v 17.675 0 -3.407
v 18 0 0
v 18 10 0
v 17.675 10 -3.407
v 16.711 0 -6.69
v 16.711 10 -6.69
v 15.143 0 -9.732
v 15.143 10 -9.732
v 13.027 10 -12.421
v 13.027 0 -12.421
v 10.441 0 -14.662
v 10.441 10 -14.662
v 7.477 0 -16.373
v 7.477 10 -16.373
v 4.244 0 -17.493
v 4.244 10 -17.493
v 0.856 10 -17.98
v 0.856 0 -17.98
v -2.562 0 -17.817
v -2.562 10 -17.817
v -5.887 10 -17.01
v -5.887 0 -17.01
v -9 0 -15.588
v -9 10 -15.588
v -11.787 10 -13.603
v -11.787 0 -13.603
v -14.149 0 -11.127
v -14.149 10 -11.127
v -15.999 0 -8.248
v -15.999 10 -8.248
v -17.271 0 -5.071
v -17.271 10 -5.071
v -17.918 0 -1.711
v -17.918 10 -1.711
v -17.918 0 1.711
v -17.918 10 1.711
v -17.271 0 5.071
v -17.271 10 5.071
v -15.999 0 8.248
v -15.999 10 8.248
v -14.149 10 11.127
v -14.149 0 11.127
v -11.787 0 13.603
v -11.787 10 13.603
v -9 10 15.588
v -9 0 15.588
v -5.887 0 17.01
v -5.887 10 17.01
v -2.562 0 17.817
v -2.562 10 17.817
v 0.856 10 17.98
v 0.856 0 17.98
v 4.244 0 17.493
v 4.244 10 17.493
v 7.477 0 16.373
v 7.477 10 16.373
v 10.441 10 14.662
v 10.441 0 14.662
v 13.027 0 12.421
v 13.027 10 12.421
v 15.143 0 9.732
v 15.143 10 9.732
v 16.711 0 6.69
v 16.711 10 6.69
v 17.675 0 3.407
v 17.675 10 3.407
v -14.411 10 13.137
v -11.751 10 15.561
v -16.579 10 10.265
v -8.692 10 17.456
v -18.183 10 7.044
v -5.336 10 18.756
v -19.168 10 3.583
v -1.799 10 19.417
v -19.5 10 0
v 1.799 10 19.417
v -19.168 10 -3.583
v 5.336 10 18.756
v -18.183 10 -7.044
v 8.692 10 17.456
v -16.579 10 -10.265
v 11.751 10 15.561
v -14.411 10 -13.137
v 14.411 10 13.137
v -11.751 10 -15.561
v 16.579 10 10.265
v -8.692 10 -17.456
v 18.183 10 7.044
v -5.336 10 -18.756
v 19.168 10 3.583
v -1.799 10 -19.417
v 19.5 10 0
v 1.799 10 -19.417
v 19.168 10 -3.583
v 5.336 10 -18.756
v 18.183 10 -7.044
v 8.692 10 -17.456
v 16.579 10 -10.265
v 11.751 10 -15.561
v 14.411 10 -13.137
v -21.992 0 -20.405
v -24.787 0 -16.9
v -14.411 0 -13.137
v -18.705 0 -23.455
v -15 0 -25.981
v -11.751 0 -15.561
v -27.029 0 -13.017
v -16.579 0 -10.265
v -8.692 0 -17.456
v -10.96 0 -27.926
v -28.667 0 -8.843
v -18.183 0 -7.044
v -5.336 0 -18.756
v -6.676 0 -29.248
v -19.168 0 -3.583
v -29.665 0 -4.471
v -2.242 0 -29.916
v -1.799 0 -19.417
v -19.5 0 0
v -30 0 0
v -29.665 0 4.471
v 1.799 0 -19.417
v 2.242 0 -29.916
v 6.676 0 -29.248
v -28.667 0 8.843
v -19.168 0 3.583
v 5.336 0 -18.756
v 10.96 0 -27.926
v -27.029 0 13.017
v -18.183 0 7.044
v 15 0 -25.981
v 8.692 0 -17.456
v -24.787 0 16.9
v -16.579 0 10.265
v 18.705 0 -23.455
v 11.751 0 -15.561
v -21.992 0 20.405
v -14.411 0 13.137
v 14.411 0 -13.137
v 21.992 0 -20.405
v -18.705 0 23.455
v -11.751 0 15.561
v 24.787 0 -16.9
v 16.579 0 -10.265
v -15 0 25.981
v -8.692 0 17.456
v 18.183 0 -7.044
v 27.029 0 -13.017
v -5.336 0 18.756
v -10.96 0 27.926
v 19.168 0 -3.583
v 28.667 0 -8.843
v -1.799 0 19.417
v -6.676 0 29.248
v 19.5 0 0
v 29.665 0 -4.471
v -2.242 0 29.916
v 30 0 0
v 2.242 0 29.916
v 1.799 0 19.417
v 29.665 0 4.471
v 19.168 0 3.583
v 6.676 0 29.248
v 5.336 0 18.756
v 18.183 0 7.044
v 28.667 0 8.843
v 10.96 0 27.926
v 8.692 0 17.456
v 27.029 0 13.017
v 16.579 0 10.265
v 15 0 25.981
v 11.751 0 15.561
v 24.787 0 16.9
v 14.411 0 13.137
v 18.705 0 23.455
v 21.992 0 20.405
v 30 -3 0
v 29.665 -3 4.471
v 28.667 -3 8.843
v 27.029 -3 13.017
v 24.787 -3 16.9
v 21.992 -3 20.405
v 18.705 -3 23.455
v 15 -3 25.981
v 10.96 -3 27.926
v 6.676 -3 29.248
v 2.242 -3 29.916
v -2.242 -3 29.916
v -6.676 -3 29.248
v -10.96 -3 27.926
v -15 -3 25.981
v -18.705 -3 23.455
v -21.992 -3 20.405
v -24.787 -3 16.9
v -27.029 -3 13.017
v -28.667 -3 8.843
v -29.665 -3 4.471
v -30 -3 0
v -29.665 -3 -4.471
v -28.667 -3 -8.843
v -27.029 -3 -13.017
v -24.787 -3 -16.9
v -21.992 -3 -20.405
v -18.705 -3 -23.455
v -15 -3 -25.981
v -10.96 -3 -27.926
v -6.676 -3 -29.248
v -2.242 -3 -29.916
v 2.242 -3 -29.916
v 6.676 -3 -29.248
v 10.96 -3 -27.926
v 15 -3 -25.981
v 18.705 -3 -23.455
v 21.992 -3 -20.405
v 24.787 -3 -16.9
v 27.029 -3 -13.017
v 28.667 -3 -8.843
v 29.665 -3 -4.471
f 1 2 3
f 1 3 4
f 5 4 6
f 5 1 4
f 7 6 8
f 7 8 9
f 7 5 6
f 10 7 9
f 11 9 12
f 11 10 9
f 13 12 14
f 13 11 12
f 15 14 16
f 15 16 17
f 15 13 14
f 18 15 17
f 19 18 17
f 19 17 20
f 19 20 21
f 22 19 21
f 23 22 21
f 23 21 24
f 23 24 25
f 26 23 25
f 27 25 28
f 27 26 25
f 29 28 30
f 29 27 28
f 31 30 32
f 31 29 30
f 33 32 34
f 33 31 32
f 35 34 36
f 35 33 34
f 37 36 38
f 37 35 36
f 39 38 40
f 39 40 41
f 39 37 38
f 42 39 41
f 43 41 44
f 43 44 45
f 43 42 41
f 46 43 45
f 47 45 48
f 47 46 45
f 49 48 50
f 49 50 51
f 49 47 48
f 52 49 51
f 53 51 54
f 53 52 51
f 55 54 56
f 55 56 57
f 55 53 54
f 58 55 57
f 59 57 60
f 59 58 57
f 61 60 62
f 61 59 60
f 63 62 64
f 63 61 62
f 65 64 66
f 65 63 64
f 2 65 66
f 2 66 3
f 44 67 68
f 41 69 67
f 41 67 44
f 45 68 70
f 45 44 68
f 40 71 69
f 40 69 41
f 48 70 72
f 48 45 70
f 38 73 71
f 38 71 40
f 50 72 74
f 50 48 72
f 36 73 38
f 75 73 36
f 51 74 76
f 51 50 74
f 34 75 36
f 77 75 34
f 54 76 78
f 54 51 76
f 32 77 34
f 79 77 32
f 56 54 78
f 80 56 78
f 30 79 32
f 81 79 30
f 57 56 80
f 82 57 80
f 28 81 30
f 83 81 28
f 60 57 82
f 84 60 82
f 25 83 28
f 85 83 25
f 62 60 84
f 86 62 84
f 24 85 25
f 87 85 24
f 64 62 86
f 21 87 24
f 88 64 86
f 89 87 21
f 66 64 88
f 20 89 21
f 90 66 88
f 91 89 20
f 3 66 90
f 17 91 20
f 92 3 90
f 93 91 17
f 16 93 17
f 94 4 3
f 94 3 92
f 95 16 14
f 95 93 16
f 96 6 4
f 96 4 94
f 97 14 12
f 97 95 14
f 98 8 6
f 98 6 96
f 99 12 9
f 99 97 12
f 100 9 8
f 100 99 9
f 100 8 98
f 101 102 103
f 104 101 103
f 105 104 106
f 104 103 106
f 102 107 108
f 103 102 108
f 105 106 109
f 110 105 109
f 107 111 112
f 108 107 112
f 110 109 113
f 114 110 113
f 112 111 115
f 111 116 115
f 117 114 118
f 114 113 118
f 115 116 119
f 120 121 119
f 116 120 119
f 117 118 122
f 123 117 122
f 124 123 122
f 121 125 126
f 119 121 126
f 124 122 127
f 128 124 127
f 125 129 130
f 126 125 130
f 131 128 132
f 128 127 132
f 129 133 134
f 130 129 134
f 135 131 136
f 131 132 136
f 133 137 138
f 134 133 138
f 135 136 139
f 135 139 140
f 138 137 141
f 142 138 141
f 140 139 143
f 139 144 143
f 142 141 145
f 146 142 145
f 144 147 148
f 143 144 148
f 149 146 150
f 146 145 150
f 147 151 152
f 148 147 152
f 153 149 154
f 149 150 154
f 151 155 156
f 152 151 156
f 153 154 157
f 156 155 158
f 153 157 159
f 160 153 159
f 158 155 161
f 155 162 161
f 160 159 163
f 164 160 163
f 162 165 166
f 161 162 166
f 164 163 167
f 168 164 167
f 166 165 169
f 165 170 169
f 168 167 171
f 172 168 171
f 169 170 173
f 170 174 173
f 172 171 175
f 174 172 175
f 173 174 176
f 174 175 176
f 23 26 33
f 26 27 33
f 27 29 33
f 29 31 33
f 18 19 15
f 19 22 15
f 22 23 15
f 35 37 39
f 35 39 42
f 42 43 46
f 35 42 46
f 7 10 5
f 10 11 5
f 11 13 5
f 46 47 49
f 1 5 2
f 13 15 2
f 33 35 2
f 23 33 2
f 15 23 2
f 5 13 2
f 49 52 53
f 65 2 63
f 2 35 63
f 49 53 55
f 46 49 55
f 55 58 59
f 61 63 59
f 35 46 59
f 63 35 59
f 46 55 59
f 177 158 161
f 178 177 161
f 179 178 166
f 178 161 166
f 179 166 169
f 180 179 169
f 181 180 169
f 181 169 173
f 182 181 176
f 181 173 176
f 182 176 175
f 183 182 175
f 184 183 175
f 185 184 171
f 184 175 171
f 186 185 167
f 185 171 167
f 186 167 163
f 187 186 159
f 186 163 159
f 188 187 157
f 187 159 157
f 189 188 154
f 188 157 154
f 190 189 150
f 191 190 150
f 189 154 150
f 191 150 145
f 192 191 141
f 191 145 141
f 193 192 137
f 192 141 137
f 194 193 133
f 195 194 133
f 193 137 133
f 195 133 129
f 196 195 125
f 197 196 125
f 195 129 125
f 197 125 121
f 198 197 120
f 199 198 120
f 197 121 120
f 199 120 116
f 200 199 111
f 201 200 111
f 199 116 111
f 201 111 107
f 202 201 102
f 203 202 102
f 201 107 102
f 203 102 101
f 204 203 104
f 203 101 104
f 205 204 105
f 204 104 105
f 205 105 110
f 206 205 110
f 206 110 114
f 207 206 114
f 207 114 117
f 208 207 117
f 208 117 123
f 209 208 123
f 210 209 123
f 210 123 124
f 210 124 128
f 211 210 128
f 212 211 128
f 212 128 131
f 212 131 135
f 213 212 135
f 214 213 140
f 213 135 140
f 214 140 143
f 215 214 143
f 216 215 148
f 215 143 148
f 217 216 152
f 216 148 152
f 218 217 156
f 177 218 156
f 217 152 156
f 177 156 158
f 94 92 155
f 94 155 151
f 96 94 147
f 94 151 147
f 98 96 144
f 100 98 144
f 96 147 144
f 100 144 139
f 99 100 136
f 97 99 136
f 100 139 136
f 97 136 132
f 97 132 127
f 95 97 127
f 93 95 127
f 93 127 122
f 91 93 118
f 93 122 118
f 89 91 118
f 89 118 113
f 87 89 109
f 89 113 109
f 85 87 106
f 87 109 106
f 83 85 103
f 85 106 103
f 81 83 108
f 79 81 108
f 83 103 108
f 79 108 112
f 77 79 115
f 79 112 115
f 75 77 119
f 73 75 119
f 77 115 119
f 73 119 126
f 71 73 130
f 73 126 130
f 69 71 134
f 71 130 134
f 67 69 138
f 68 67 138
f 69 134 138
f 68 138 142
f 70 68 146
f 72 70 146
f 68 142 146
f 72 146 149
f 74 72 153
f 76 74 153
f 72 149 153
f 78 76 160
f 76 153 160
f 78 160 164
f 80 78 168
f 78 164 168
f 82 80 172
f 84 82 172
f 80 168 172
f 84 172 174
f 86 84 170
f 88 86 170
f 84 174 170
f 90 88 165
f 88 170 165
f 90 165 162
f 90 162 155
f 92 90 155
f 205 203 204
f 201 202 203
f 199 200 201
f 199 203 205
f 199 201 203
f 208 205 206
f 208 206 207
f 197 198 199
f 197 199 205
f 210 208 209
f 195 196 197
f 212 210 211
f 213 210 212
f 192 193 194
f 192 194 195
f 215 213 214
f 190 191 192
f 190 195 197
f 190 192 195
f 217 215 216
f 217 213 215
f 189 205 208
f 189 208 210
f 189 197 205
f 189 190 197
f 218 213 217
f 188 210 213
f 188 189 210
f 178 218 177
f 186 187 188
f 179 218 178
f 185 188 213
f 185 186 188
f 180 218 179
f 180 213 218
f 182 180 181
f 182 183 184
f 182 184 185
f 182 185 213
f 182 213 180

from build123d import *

# Parameters (mm, degrees)
SKETCH_1_R      = 19.5
SKETCH_1_R_2    = 18
EXTRUDE_1_DEPTH = 10
SKETCH_3_R      = 30
EXTRUDE_2_DEPTH = 3


with BuildPart() as part:
    # 草圖1 → 填料-伸長1 (new body)
    with BuildSketch(Plane(origin=(0, 0, 0), x_dir=(1, 0, 0), z_dir=(0, 1, 0))):
        Circle(SKETCH_1_R)
        Circle(SKETCH_1_R_2, mode=Mode.SUBTRACT)
    extrude(amount=EXTRUDE_1_DEPTH)

    # 草圖3 → 填料-伸長2 (add)
    with BuildSketch(Plane.XZ):
        Circle(SKETCH_3_R)
    extrude(amount=EXTRUDE_2_DEPTH)


solid = part.part
